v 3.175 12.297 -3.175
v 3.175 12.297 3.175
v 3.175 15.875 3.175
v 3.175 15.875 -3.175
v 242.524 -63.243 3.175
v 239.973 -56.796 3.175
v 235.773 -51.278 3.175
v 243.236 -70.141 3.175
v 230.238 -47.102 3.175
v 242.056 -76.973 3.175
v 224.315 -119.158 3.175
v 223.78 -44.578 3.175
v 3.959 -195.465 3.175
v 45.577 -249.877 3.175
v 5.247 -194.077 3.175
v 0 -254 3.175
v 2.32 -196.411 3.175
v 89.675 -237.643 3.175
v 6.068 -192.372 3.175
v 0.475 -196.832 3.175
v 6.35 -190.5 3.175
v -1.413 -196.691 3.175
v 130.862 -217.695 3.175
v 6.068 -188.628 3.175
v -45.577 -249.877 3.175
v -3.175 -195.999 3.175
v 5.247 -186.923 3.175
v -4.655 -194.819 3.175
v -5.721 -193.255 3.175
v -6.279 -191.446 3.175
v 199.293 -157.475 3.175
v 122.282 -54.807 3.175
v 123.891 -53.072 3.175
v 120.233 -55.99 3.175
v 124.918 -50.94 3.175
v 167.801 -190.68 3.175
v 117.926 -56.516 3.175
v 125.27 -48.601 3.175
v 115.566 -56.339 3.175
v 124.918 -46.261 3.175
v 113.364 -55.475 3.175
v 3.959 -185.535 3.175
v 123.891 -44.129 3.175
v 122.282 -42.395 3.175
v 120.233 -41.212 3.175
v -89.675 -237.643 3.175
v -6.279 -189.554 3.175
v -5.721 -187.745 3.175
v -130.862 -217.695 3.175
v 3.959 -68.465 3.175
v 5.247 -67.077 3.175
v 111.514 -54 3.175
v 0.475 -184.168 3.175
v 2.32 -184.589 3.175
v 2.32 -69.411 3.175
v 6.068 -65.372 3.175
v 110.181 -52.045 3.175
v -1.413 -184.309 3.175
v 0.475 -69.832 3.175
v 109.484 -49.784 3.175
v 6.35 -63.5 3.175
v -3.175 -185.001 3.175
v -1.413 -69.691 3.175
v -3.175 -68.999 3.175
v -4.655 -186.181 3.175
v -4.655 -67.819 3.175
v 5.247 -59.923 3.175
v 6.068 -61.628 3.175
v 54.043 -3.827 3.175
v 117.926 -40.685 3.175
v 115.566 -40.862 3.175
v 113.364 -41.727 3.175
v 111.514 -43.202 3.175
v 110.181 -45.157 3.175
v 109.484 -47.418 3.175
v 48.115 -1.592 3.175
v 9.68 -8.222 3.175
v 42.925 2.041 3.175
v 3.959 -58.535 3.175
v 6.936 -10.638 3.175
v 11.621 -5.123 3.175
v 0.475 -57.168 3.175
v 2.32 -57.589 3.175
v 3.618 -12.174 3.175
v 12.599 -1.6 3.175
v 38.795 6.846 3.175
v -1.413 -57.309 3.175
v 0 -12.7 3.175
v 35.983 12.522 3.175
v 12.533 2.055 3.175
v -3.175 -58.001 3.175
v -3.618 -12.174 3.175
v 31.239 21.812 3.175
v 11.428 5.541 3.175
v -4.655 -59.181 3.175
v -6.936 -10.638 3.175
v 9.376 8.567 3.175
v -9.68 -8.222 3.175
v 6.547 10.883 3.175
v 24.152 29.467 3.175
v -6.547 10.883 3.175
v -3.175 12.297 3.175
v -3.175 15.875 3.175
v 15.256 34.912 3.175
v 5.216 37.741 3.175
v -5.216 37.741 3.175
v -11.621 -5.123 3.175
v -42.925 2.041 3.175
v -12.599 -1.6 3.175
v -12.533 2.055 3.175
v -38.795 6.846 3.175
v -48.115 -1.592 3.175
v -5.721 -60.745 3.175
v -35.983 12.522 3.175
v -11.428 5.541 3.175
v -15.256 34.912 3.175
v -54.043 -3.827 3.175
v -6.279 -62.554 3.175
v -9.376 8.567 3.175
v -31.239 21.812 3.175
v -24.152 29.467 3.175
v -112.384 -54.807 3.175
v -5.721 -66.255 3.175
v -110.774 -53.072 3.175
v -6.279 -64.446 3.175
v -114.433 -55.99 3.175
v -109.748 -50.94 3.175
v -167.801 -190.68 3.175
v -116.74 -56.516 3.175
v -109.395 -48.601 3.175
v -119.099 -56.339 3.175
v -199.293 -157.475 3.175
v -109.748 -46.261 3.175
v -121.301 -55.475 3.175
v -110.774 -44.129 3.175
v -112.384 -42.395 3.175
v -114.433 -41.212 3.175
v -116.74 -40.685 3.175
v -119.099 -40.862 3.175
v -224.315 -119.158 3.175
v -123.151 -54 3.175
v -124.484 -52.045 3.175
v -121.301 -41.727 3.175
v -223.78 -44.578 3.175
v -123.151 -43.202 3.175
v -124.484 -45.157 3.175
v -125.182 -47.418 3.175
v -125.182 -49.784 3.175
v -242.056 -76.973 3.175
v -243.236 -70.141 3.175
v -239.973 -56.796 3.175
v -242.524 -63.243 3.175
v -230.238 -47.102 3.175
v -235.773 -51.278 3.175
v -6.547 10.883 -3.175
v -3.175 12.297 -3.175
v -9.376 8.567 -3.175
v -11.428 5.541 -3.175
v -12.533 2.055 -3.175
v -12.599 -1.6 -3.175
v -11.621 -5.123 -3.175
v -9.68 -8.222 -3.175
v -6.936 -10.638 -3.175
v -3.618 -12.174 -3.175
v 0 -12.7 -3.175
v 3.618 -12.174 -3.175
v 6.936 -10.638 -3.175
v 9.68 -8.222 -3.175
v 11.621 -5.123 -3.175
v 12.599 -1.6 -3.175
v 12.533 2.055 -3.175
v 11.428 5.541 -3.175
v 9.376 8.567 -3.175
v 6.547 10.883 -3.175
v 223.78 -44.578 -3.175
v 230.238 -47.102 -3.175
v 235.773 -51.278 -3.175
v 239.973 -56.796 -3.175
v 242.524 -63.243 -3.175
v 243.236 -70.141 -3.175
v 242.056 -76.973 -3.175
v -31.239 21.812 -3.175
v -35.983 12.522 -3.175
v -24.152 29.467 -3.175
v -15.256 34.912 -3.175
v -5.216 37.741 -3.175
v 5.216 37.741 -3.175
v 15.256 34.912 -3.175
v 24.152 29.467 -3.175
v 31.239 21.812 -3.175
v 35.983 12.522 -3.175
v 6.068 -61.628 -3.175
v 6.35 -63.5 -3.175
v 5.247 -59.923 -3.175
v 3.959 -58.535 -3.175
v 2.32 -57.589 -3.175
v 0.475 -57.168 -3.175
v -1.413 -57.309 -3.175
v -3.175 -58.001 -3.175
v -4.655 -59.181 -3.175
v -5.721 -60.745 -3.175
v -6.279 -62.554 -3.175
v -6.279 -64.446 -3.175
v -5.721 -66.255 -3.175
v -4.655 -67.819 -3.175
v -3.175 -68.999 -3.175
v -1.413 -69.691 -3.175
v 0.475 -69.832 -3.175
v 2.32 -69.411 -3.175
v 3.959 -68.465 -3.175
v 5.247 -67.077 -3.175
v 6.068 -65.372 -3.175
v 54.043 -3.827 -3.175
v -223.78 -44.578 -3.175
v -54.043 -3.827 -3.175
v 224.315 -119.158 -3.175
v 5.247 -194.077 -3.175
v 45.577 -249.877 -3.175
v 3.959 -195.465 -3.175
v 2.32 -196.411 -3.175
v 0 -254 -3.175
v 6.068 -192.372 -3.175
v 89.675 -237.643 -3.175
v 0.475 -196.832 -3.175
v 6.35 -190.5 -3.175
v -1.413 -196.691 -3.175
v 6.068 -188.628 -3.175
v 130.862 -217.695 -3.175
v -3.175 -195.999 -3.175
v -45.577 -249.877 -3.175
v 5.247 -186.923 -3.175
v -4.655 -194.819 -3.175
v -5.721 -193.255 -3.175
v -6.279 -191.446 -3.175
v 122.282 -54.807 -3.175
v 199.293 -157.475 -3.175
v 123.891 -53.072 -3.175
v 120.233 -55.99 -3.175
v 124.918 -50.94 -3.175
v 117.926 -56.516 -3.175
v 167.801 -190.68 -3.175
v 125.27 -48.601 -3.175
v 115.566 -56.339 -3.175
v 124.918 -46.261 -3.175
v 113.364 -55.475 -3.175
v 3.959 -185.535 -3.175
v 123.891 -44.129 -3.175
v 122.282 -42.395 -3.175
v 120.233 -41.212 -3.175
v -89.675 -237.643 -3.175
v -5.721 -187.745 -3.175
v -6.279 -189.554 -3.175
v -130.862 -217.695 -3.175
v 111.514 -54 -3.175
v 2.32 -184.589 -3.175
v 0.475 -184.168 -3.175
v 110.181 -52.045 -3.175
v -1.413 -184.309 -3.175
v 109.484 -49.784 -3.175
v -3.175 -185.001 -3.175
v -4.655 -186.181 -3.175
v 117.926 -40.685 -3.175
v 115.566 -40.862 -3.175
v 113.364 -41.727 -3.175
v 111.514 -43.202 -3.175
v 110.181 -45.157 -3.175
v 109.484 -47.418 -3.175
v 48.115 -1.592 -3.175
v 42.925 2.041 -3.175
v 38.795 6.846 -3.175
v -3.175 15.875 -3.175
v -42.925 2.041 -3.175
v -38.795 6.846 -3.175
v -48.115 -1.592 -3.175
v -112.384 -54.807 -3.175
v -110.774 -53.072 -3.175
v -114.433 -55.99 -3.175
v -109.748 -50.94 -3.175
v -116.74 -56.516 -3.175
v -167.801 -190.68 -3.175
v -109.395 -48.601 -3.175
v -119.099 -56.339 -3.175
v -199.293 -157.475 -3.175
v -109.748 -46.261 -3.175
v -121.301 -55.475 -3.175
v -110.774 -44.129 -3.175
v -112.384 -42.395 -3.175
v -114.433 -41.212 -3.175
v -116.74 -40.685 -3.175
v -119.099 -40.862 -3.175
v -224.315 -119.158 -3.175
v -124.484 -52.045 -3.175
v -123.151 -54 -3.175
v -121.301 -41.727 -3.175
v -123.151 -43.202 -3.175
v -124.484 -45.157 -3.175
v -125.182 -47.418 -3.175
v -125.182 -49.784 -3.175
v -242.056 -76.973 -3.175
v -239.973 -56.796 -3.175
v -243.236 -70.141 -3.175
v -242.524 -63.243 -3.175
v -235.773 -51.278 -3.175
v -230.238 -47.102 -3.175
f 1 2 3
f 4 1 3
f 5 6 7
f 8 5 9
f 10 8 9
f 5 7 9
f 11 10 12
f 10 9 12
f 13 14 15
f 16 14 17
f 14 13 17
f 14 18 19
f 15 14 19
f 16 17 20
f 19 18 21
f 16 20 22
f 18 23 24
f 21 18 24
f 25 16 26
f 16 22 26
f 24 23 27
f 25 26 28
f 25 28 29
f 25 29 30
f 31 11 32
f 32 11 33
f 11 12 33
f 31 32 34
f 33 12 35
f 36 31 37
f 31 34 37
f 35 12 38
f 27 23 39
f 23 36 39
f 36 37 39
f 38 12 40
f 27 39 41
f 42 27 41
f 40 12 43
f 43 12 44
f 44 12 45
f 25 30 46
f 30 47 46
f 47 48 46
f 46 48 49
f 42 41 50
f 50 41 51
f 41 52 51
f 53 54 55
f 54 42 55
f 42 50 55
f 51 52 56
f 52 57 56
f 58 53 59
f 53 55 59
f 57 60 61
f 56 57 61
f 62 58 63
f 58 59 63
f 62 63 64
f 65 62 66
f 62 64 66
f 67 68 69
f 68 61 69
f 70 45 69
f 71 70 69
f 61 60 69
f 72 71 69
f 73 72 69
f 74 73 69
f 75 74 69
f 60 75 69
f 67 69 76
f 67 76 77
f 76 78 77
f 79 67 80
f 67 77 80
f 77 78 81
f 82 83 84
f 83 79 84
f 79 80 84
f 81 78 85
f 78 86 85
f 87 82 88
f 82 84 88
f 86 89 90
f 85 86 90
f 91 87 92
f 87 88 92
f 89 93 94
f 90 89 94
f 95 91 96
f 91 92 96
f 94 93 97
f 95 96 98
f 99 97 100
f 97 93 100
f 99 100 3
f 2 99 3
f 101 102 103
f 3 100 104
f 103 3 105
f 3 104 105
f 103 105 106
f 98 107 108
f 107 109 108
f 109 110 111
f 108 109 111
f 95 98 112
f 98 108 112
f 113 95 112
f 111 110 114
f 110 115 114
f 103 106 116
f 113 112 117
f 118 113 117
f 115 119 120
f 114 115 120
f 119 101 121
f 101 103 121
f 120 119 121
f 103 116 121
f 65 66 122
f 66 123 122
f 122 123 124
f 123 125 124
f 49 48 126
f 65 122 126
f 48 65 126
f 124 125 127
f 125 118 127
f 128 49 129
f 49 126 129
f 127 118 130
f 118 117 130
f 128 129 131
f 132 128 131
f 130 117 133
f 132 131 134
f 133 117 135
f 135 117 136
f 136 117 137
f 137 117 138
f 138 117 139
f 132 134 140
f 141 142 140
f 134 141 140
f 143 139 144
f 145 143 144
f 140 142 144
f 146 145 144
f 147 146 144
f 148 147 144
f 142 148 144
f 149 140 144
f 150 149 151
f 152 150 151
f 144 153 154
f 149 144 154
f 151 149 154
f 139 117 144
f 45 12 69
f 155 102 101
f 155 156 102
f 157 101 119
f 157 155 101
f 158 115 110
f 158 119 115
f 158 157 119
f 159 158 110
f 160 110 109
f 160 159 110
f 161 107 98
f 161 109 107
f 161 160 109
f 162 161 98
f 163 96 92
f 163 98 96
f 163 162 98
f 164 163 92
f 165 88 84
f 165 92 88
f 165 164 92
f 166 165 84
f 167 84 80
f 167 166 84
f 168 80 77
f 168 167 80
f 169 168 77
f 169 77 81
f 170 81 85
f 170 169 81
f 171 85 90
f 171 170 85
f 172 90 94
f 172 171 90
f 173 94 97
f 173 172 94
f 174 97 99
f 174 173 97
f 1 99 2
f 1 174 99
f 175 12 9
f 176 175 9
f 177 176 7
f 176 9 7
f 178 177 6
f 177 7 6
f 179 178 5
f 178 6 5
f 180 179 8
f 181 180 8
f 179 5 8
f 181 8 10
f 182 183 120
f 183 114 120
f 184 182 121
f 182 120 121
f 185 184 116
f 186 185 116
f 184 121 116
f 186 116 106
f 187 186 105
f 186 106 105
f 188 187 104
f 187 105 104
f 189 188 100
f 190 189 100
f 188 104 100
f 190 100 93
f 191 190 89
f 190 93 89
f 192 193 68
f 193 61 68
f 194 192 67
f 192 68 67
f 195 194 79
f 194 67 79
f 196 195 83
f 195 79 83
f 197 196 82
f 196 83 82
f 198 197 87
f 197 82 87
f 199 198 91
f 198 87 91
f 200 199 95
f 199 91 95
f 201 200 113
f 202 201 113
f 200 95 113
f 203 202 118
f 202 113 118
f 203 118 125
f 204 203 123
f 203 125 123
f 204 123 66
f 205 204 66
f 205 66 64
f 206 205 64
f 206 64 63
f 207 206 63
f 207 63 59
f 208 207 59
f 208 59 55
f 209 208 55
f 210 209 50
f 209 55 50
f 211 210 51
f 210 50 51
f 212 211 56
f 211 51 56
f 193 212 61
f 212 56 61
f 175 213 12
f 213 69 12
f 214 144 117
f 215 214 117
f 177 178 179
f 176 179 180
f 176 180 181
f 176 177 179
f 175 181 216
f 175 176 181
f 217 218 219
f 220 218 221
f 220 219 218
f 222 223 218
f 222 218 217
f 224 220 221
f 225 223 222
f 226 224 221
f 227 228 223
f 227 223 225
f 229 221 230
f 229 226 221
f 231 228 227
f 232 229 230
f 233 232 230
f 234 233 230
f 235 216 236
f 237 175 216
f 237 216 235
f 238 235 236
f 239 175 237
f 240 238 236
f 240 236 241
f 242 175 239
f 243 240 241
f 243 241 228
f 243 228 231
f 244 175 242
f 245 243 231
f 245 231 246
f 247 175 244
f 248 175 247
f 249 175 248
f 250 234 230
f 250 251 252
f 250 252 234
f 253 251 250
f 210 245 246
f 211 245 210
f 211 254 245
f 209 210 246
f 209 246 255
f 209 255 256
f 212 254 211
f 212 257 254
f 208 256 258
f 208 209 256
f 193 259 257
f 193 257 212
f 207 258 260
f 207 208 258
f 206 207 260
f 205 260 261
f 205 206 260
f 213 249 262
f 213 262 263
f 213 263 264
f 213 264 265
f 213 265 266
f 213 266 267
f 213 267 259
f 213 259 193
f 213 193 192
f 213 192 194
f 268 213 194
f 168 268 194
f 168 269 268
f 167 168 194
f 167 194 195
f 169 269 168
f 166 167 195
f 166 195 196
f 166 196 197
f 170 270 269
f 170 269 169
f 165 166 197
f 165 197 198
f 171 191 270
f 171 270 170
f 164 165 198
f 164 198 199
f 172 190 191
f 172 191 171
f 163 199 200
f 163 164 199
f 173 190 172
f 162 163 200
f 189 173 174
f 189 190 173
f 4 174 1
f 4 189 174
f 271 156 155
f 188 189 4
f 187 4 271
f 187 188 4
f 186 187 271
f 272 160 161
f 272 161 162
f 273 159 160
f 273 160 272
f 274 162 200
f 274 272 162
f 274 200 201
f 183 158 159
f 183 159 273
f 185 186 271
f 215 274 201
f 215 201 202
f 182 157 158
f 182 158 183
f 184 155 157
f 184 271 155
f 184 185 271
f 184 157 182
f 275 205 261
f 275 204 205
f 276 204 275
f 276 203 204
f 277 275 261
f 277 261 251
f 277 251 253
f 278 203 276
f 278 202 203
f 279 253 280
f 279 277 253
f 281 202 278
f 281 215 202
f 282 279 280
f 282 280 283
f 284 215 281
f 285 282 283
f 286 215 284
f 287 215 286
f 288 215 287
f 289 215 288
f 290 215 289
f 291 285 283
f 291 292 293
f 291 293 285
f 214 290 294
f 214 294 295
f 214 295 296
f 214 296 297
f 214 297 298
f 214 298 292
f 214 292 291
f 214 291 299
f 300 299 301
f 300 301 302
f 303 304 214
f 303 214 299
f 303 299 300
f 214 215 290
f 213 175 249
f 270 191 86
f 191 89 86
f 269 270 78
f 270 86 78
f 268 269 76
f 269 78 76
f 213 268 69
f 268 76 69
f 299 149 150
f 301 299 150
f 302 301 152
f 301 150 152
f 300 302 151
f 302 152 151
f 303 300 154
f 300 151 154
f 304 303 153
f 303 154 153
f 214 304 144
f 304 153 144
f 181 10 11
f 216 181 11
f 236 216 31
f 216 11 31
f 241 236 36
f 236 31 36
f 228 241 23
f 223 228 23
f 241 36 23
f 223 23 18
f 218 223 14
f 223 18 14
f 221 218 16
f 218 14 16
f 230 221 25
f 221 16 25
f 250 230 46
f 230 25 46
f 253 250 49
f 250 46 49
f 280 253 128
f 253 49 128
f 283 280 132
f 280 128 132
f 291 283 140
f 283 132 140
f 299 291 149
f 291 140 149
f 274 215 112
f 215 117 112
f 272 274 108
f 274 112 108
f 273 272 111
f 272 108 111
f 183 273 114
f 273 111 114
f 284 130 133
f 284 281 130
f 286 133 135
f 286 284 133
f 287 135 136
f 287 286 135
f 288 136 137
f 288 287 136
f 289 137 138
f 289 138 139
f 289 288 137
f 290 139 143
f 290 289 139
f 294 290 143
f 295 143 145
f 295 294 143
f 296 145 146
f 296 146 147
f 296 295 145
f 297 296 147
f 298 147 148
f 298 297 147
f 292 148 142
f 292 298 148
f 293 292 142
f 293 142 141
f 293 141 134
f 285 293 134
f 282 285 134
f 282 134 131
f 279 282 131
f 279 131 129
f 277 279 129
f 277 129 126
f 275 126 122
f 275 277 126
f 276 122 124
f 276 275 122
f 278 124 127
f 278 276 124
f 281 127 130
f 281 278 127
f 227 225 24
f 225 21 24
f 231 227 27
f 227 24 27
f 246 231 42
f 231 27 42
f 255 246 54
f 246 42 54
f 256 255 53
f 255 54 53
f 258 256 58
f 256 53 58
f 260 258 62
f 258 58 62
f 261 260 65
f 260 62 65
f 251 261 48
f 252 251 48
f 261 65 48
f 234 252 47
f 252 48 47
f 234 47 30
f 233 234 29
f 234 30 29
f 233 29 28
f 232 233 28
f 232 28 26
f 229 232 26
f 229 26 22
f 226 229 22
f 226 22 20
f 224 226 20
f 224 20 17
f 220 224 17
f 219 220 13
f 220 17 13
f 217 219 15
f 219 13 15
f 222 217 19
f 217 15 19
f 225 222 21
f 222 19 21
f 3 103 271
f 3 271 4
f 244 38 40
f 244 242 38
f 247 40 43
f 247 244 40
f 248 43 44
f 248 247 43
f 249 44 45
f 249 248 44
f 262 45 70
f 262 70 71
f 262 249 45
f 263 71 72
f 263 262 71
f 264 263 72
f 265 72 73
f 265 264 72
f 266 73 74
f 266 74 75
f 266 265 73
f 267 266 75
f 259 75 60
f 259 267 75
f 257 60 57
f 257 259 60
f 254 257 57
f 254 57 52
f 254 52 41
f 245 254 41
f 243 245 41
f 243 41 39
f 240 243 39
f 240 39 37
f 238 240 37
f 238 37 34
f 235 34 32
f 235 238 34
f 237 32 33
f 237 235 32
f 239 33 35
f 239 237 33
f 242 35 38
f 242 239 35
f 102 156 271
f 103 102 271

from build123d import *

# Parameters (mm, degrees)
SKETCH5_R               = 12.7
SKETCH5_R_2             = 7.9375
BOSS_EXTRUDE2_DEPTH     = 3.175
SKETCH8_W               = 6.35
SKETCH8_H               = 6.35
CUT_EXTRUDE1_DEPTH      = 4.175
CUT_EXTRUDE1_DEPTH_BACK = 4.175
SKETCH9_R               = 6.35
CUT_EXTRUDE2_DEPTH      = 4.175
CUT_EXTRUDE2_DEPTH_BACK = 4.175


with BuildPart() as part:
    # Sketch5 → Boss-Extrude2 (new body, symmetric)
    with BuildSketch(Plane.XY):
        with BuildLine():
            Line((-223.779910529, -44.577802506), (-54.04268144, -3.827499177))
            ThreePointArc((-54.04268144, -3.827499177), (-42.924981025, 2.041131203), (-35.983316209, 12.522418081))
            ThreePointArc((-35.983316209, 12.522418081), (0, 38.1), (35.983316209, 12.522418081))
            ThreePointArc((35.983316209, 12.522418081), (42.924981025, 2.041131203), (54.04268144, -3.827499177))
            Line((54.04268144, -3.827499177), (223.779910529, -44.577802506))
            ThreePointArc((223.779910529, -44.577802506), (239.972758508, -56.795566669), (242.055998097, -76.973331649))
            ThreePointArc((242.055998097, -76.973331649), (0, -254), (-242.055998097, -76.973331649))
            ThreePointArc((-242.055998097, -76.973331649), (-239.972758508, -56.795566669), (-223.779910529, -44.577802506))
        make_face()
        Circle(SKETCH5_R, mode=Mode.SUBTRACT)
        with Locations((-117.332700629, -48.60079591)):
            Circle(SKETCH5_R_2, mode=Mode.SUBTRACT)
        with Locations((117.332700629, -48.60079591)):
            Circle(SKETCH5_R_2, mode=Mode.SUBTRACT)
    extrude(amount=BOSS_EXTRUDE2_DEPTH, both=True)

    # Sketch8 → Cut-Extrude1 (cut, two sides)
    with BuildSketch(Plane.XY) as cut_extrude1_sk:
        with Locations((0, 12.7)):
            Rectangle(SKETCH8_W, SKETCH8_H)
    extrude(amount=CUT_EXTRUDE1_DEPTH, mode=Mode.SUBTRACT)
    extrude(cut_extrude1_sk.sketch, amount=-CUT_EXTRUDE1_DEPTH_BACK, mode=Mode.SUBTRACT)

    # Sketch9 → Cut-Extrude2 (cut, two sides)
    with BuildSketch(Plane.XY) as cut_extrude2_sk:
        with Locations((0, -63.5)):
            Circle(SKETCH9_R)
        with Locations((0, -190.5)):
            Circle(SKETCH9_R)
    extrude(amount=CUT_EXTRUDE2_DEPTH, mode=Mode.SUBTRACT)
    extrude(cut_extrude2_sk.sketch, amount=-CUT_EXTRUDE2_DEPTH_BACK, mode=Mode.SUBTRACT)


solid = part.part
